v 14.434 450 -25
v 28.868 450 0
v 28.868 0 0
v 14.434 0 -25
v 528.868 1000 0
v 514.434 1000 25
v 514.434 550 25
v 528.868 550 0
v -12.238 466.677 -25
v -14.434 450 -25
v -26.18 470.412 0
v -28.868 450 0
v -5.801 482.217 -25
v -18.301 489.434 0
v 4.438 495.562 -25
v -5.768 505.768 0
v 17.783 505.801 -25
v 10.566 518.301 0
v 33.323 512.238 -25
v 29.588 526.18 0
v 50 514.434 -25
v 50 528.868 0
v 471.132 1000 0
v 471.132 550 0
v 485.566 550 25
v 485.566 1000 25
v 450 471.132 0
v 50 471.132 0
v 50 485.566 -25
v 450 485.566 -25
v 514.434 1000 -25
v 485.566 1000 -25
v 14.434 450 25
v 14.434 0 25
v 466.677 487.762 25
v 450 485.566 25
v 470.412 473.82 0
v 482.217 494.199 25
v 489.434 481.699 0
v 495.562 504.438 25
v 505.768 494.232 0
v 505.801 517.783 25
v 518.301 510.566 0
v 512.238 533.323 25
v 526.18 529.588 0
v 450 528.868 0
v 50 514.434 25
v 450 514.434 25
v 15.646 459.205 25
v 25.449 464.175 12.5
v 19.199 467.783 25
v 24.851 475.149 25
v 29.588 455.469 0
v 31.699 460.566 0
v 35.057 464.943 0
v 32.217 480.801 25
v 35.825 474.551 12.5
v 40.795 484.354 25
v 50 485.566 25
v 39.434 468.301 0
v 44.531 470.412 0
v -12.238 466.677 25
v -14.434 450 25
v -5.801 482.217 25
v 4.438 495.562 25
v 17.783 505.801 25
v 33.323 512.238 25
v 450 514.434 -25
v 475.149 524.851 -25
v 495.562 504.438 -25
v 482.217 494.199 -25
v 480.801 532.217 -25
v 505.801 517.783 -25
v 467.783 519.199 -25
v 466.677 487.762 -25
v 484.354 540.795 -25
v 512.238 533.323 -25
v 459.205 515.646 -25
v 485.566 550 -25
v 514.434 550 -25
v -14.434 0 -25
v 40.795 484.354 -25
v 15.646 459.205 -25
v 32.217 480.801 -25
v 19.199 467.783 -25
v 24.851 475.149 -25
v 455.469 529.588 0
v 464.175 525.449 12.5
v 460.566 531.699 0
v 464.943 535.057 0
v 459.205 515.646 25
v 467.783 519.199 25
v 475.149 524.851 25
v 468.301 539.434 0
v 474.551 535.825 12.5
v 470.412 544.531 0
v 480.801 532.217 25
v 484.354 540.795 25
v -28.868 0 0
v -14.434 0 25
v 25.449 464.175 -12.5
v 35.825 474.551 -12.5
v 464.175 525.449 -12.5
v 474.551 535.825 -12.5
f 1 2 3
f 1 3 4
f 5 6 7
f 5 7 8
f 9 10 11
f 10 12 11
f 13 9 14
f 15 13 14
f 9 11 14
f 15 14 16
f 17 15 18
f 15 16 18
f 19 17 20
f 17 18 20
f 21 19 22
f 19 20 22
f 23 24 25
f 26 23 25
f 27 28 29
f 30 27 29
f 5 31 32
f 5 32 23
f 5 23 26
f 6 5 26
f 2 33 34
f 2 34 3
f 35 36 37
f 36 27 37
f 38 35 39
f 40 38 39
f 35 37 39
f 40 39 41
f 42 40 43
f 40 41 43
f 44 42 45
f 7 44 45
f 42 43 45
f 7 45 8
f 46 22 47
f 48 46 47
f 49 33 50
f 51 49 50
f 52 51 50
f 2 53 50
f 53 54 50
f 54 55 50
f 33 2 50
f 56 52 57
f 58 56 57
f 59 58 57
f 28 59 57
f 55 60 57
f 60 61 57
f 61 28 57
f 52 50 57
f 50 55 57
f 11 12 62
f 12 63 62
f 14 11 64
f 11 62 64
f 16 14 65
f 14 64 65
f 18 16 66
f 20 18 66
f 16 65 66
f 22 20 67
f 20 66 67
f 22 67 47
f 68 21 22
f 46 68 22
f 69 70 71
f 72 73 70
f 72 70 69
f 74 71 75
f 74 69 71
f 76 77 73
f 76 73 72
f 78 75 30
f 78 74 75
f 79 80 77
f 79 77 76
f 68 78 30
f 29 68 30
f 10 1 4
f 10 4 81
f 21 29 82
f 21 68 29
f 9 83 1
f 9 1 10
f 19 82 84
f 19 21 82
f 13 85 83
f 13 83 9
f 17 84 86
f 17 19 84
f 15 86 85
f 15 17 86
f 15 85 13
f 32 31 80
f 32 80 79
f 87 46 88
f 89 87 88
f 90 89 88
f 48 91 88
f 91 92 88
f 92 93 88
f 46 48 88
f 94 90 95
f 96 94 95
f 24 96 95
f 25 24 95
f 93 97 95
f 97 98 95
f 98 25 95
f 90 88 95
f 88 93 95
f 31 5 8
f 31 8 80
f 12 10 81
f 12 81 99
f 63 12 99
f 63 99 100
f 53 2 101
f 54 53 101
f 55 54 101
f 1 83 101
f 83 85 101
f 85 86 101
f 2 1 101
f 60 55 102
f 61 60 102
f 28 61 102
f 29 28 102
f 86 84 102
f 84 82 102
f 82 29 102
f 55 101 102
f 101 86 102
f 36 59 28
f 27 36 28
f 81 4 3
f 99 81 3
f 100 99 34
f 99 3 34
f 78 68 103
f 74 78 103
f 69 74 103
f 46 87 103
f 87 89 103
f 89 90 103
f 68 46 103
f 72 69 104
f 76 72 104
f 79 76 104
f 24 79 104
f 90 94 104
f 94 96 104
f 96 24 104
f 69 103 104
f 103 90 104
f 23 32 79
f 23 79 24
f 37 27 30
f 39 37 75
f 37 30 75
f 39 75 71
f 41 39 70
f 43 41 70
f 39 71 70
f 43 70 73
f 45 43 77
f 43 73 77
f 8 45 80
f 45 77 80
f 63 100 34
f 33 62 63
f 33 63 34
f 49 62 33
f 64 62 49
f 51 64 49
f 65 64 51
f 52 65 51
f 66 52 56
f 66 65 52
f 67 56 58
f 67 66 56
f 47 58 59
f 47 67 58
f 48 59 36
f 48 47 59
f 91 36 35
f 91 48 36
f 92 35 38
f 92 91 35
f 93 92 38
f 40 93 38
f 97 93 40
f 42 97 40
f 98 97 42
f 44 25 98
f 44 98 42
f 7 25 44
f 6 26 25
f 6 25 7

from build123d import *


with BuildPart() as part:
    # Sweep5: sweep along a path in Sketch1
    with BuildLine(Plane.XY) as sweep5_path:
        Line((0, 0), (0, 450))
        ThreePointArc((0, 450), (14.644660941, 485.355339059), (50, 500))
        Line((50, 500), (450, 500))
        ThreePointArc((450, 500), (485.355339059, 514.644660941), (500, 550))
        Line((500, 550), (500, 1000))
    # Sketch12 → Sweep5 (sweep)
    with BuildSketch(Plane(origin=(0, 0, 0), x_dir=(1, 0, 0), z_dir=(0, 1, 0))):
        Polygon((-14.43375673, -25), (14.43375673, -25), (28.867513459, 0), (14.43375673, 25), (-14.43375673, 25), (-28.867513459, 0), align=None)
    sweep(path=sweep5_path.line)


solid = part.part
